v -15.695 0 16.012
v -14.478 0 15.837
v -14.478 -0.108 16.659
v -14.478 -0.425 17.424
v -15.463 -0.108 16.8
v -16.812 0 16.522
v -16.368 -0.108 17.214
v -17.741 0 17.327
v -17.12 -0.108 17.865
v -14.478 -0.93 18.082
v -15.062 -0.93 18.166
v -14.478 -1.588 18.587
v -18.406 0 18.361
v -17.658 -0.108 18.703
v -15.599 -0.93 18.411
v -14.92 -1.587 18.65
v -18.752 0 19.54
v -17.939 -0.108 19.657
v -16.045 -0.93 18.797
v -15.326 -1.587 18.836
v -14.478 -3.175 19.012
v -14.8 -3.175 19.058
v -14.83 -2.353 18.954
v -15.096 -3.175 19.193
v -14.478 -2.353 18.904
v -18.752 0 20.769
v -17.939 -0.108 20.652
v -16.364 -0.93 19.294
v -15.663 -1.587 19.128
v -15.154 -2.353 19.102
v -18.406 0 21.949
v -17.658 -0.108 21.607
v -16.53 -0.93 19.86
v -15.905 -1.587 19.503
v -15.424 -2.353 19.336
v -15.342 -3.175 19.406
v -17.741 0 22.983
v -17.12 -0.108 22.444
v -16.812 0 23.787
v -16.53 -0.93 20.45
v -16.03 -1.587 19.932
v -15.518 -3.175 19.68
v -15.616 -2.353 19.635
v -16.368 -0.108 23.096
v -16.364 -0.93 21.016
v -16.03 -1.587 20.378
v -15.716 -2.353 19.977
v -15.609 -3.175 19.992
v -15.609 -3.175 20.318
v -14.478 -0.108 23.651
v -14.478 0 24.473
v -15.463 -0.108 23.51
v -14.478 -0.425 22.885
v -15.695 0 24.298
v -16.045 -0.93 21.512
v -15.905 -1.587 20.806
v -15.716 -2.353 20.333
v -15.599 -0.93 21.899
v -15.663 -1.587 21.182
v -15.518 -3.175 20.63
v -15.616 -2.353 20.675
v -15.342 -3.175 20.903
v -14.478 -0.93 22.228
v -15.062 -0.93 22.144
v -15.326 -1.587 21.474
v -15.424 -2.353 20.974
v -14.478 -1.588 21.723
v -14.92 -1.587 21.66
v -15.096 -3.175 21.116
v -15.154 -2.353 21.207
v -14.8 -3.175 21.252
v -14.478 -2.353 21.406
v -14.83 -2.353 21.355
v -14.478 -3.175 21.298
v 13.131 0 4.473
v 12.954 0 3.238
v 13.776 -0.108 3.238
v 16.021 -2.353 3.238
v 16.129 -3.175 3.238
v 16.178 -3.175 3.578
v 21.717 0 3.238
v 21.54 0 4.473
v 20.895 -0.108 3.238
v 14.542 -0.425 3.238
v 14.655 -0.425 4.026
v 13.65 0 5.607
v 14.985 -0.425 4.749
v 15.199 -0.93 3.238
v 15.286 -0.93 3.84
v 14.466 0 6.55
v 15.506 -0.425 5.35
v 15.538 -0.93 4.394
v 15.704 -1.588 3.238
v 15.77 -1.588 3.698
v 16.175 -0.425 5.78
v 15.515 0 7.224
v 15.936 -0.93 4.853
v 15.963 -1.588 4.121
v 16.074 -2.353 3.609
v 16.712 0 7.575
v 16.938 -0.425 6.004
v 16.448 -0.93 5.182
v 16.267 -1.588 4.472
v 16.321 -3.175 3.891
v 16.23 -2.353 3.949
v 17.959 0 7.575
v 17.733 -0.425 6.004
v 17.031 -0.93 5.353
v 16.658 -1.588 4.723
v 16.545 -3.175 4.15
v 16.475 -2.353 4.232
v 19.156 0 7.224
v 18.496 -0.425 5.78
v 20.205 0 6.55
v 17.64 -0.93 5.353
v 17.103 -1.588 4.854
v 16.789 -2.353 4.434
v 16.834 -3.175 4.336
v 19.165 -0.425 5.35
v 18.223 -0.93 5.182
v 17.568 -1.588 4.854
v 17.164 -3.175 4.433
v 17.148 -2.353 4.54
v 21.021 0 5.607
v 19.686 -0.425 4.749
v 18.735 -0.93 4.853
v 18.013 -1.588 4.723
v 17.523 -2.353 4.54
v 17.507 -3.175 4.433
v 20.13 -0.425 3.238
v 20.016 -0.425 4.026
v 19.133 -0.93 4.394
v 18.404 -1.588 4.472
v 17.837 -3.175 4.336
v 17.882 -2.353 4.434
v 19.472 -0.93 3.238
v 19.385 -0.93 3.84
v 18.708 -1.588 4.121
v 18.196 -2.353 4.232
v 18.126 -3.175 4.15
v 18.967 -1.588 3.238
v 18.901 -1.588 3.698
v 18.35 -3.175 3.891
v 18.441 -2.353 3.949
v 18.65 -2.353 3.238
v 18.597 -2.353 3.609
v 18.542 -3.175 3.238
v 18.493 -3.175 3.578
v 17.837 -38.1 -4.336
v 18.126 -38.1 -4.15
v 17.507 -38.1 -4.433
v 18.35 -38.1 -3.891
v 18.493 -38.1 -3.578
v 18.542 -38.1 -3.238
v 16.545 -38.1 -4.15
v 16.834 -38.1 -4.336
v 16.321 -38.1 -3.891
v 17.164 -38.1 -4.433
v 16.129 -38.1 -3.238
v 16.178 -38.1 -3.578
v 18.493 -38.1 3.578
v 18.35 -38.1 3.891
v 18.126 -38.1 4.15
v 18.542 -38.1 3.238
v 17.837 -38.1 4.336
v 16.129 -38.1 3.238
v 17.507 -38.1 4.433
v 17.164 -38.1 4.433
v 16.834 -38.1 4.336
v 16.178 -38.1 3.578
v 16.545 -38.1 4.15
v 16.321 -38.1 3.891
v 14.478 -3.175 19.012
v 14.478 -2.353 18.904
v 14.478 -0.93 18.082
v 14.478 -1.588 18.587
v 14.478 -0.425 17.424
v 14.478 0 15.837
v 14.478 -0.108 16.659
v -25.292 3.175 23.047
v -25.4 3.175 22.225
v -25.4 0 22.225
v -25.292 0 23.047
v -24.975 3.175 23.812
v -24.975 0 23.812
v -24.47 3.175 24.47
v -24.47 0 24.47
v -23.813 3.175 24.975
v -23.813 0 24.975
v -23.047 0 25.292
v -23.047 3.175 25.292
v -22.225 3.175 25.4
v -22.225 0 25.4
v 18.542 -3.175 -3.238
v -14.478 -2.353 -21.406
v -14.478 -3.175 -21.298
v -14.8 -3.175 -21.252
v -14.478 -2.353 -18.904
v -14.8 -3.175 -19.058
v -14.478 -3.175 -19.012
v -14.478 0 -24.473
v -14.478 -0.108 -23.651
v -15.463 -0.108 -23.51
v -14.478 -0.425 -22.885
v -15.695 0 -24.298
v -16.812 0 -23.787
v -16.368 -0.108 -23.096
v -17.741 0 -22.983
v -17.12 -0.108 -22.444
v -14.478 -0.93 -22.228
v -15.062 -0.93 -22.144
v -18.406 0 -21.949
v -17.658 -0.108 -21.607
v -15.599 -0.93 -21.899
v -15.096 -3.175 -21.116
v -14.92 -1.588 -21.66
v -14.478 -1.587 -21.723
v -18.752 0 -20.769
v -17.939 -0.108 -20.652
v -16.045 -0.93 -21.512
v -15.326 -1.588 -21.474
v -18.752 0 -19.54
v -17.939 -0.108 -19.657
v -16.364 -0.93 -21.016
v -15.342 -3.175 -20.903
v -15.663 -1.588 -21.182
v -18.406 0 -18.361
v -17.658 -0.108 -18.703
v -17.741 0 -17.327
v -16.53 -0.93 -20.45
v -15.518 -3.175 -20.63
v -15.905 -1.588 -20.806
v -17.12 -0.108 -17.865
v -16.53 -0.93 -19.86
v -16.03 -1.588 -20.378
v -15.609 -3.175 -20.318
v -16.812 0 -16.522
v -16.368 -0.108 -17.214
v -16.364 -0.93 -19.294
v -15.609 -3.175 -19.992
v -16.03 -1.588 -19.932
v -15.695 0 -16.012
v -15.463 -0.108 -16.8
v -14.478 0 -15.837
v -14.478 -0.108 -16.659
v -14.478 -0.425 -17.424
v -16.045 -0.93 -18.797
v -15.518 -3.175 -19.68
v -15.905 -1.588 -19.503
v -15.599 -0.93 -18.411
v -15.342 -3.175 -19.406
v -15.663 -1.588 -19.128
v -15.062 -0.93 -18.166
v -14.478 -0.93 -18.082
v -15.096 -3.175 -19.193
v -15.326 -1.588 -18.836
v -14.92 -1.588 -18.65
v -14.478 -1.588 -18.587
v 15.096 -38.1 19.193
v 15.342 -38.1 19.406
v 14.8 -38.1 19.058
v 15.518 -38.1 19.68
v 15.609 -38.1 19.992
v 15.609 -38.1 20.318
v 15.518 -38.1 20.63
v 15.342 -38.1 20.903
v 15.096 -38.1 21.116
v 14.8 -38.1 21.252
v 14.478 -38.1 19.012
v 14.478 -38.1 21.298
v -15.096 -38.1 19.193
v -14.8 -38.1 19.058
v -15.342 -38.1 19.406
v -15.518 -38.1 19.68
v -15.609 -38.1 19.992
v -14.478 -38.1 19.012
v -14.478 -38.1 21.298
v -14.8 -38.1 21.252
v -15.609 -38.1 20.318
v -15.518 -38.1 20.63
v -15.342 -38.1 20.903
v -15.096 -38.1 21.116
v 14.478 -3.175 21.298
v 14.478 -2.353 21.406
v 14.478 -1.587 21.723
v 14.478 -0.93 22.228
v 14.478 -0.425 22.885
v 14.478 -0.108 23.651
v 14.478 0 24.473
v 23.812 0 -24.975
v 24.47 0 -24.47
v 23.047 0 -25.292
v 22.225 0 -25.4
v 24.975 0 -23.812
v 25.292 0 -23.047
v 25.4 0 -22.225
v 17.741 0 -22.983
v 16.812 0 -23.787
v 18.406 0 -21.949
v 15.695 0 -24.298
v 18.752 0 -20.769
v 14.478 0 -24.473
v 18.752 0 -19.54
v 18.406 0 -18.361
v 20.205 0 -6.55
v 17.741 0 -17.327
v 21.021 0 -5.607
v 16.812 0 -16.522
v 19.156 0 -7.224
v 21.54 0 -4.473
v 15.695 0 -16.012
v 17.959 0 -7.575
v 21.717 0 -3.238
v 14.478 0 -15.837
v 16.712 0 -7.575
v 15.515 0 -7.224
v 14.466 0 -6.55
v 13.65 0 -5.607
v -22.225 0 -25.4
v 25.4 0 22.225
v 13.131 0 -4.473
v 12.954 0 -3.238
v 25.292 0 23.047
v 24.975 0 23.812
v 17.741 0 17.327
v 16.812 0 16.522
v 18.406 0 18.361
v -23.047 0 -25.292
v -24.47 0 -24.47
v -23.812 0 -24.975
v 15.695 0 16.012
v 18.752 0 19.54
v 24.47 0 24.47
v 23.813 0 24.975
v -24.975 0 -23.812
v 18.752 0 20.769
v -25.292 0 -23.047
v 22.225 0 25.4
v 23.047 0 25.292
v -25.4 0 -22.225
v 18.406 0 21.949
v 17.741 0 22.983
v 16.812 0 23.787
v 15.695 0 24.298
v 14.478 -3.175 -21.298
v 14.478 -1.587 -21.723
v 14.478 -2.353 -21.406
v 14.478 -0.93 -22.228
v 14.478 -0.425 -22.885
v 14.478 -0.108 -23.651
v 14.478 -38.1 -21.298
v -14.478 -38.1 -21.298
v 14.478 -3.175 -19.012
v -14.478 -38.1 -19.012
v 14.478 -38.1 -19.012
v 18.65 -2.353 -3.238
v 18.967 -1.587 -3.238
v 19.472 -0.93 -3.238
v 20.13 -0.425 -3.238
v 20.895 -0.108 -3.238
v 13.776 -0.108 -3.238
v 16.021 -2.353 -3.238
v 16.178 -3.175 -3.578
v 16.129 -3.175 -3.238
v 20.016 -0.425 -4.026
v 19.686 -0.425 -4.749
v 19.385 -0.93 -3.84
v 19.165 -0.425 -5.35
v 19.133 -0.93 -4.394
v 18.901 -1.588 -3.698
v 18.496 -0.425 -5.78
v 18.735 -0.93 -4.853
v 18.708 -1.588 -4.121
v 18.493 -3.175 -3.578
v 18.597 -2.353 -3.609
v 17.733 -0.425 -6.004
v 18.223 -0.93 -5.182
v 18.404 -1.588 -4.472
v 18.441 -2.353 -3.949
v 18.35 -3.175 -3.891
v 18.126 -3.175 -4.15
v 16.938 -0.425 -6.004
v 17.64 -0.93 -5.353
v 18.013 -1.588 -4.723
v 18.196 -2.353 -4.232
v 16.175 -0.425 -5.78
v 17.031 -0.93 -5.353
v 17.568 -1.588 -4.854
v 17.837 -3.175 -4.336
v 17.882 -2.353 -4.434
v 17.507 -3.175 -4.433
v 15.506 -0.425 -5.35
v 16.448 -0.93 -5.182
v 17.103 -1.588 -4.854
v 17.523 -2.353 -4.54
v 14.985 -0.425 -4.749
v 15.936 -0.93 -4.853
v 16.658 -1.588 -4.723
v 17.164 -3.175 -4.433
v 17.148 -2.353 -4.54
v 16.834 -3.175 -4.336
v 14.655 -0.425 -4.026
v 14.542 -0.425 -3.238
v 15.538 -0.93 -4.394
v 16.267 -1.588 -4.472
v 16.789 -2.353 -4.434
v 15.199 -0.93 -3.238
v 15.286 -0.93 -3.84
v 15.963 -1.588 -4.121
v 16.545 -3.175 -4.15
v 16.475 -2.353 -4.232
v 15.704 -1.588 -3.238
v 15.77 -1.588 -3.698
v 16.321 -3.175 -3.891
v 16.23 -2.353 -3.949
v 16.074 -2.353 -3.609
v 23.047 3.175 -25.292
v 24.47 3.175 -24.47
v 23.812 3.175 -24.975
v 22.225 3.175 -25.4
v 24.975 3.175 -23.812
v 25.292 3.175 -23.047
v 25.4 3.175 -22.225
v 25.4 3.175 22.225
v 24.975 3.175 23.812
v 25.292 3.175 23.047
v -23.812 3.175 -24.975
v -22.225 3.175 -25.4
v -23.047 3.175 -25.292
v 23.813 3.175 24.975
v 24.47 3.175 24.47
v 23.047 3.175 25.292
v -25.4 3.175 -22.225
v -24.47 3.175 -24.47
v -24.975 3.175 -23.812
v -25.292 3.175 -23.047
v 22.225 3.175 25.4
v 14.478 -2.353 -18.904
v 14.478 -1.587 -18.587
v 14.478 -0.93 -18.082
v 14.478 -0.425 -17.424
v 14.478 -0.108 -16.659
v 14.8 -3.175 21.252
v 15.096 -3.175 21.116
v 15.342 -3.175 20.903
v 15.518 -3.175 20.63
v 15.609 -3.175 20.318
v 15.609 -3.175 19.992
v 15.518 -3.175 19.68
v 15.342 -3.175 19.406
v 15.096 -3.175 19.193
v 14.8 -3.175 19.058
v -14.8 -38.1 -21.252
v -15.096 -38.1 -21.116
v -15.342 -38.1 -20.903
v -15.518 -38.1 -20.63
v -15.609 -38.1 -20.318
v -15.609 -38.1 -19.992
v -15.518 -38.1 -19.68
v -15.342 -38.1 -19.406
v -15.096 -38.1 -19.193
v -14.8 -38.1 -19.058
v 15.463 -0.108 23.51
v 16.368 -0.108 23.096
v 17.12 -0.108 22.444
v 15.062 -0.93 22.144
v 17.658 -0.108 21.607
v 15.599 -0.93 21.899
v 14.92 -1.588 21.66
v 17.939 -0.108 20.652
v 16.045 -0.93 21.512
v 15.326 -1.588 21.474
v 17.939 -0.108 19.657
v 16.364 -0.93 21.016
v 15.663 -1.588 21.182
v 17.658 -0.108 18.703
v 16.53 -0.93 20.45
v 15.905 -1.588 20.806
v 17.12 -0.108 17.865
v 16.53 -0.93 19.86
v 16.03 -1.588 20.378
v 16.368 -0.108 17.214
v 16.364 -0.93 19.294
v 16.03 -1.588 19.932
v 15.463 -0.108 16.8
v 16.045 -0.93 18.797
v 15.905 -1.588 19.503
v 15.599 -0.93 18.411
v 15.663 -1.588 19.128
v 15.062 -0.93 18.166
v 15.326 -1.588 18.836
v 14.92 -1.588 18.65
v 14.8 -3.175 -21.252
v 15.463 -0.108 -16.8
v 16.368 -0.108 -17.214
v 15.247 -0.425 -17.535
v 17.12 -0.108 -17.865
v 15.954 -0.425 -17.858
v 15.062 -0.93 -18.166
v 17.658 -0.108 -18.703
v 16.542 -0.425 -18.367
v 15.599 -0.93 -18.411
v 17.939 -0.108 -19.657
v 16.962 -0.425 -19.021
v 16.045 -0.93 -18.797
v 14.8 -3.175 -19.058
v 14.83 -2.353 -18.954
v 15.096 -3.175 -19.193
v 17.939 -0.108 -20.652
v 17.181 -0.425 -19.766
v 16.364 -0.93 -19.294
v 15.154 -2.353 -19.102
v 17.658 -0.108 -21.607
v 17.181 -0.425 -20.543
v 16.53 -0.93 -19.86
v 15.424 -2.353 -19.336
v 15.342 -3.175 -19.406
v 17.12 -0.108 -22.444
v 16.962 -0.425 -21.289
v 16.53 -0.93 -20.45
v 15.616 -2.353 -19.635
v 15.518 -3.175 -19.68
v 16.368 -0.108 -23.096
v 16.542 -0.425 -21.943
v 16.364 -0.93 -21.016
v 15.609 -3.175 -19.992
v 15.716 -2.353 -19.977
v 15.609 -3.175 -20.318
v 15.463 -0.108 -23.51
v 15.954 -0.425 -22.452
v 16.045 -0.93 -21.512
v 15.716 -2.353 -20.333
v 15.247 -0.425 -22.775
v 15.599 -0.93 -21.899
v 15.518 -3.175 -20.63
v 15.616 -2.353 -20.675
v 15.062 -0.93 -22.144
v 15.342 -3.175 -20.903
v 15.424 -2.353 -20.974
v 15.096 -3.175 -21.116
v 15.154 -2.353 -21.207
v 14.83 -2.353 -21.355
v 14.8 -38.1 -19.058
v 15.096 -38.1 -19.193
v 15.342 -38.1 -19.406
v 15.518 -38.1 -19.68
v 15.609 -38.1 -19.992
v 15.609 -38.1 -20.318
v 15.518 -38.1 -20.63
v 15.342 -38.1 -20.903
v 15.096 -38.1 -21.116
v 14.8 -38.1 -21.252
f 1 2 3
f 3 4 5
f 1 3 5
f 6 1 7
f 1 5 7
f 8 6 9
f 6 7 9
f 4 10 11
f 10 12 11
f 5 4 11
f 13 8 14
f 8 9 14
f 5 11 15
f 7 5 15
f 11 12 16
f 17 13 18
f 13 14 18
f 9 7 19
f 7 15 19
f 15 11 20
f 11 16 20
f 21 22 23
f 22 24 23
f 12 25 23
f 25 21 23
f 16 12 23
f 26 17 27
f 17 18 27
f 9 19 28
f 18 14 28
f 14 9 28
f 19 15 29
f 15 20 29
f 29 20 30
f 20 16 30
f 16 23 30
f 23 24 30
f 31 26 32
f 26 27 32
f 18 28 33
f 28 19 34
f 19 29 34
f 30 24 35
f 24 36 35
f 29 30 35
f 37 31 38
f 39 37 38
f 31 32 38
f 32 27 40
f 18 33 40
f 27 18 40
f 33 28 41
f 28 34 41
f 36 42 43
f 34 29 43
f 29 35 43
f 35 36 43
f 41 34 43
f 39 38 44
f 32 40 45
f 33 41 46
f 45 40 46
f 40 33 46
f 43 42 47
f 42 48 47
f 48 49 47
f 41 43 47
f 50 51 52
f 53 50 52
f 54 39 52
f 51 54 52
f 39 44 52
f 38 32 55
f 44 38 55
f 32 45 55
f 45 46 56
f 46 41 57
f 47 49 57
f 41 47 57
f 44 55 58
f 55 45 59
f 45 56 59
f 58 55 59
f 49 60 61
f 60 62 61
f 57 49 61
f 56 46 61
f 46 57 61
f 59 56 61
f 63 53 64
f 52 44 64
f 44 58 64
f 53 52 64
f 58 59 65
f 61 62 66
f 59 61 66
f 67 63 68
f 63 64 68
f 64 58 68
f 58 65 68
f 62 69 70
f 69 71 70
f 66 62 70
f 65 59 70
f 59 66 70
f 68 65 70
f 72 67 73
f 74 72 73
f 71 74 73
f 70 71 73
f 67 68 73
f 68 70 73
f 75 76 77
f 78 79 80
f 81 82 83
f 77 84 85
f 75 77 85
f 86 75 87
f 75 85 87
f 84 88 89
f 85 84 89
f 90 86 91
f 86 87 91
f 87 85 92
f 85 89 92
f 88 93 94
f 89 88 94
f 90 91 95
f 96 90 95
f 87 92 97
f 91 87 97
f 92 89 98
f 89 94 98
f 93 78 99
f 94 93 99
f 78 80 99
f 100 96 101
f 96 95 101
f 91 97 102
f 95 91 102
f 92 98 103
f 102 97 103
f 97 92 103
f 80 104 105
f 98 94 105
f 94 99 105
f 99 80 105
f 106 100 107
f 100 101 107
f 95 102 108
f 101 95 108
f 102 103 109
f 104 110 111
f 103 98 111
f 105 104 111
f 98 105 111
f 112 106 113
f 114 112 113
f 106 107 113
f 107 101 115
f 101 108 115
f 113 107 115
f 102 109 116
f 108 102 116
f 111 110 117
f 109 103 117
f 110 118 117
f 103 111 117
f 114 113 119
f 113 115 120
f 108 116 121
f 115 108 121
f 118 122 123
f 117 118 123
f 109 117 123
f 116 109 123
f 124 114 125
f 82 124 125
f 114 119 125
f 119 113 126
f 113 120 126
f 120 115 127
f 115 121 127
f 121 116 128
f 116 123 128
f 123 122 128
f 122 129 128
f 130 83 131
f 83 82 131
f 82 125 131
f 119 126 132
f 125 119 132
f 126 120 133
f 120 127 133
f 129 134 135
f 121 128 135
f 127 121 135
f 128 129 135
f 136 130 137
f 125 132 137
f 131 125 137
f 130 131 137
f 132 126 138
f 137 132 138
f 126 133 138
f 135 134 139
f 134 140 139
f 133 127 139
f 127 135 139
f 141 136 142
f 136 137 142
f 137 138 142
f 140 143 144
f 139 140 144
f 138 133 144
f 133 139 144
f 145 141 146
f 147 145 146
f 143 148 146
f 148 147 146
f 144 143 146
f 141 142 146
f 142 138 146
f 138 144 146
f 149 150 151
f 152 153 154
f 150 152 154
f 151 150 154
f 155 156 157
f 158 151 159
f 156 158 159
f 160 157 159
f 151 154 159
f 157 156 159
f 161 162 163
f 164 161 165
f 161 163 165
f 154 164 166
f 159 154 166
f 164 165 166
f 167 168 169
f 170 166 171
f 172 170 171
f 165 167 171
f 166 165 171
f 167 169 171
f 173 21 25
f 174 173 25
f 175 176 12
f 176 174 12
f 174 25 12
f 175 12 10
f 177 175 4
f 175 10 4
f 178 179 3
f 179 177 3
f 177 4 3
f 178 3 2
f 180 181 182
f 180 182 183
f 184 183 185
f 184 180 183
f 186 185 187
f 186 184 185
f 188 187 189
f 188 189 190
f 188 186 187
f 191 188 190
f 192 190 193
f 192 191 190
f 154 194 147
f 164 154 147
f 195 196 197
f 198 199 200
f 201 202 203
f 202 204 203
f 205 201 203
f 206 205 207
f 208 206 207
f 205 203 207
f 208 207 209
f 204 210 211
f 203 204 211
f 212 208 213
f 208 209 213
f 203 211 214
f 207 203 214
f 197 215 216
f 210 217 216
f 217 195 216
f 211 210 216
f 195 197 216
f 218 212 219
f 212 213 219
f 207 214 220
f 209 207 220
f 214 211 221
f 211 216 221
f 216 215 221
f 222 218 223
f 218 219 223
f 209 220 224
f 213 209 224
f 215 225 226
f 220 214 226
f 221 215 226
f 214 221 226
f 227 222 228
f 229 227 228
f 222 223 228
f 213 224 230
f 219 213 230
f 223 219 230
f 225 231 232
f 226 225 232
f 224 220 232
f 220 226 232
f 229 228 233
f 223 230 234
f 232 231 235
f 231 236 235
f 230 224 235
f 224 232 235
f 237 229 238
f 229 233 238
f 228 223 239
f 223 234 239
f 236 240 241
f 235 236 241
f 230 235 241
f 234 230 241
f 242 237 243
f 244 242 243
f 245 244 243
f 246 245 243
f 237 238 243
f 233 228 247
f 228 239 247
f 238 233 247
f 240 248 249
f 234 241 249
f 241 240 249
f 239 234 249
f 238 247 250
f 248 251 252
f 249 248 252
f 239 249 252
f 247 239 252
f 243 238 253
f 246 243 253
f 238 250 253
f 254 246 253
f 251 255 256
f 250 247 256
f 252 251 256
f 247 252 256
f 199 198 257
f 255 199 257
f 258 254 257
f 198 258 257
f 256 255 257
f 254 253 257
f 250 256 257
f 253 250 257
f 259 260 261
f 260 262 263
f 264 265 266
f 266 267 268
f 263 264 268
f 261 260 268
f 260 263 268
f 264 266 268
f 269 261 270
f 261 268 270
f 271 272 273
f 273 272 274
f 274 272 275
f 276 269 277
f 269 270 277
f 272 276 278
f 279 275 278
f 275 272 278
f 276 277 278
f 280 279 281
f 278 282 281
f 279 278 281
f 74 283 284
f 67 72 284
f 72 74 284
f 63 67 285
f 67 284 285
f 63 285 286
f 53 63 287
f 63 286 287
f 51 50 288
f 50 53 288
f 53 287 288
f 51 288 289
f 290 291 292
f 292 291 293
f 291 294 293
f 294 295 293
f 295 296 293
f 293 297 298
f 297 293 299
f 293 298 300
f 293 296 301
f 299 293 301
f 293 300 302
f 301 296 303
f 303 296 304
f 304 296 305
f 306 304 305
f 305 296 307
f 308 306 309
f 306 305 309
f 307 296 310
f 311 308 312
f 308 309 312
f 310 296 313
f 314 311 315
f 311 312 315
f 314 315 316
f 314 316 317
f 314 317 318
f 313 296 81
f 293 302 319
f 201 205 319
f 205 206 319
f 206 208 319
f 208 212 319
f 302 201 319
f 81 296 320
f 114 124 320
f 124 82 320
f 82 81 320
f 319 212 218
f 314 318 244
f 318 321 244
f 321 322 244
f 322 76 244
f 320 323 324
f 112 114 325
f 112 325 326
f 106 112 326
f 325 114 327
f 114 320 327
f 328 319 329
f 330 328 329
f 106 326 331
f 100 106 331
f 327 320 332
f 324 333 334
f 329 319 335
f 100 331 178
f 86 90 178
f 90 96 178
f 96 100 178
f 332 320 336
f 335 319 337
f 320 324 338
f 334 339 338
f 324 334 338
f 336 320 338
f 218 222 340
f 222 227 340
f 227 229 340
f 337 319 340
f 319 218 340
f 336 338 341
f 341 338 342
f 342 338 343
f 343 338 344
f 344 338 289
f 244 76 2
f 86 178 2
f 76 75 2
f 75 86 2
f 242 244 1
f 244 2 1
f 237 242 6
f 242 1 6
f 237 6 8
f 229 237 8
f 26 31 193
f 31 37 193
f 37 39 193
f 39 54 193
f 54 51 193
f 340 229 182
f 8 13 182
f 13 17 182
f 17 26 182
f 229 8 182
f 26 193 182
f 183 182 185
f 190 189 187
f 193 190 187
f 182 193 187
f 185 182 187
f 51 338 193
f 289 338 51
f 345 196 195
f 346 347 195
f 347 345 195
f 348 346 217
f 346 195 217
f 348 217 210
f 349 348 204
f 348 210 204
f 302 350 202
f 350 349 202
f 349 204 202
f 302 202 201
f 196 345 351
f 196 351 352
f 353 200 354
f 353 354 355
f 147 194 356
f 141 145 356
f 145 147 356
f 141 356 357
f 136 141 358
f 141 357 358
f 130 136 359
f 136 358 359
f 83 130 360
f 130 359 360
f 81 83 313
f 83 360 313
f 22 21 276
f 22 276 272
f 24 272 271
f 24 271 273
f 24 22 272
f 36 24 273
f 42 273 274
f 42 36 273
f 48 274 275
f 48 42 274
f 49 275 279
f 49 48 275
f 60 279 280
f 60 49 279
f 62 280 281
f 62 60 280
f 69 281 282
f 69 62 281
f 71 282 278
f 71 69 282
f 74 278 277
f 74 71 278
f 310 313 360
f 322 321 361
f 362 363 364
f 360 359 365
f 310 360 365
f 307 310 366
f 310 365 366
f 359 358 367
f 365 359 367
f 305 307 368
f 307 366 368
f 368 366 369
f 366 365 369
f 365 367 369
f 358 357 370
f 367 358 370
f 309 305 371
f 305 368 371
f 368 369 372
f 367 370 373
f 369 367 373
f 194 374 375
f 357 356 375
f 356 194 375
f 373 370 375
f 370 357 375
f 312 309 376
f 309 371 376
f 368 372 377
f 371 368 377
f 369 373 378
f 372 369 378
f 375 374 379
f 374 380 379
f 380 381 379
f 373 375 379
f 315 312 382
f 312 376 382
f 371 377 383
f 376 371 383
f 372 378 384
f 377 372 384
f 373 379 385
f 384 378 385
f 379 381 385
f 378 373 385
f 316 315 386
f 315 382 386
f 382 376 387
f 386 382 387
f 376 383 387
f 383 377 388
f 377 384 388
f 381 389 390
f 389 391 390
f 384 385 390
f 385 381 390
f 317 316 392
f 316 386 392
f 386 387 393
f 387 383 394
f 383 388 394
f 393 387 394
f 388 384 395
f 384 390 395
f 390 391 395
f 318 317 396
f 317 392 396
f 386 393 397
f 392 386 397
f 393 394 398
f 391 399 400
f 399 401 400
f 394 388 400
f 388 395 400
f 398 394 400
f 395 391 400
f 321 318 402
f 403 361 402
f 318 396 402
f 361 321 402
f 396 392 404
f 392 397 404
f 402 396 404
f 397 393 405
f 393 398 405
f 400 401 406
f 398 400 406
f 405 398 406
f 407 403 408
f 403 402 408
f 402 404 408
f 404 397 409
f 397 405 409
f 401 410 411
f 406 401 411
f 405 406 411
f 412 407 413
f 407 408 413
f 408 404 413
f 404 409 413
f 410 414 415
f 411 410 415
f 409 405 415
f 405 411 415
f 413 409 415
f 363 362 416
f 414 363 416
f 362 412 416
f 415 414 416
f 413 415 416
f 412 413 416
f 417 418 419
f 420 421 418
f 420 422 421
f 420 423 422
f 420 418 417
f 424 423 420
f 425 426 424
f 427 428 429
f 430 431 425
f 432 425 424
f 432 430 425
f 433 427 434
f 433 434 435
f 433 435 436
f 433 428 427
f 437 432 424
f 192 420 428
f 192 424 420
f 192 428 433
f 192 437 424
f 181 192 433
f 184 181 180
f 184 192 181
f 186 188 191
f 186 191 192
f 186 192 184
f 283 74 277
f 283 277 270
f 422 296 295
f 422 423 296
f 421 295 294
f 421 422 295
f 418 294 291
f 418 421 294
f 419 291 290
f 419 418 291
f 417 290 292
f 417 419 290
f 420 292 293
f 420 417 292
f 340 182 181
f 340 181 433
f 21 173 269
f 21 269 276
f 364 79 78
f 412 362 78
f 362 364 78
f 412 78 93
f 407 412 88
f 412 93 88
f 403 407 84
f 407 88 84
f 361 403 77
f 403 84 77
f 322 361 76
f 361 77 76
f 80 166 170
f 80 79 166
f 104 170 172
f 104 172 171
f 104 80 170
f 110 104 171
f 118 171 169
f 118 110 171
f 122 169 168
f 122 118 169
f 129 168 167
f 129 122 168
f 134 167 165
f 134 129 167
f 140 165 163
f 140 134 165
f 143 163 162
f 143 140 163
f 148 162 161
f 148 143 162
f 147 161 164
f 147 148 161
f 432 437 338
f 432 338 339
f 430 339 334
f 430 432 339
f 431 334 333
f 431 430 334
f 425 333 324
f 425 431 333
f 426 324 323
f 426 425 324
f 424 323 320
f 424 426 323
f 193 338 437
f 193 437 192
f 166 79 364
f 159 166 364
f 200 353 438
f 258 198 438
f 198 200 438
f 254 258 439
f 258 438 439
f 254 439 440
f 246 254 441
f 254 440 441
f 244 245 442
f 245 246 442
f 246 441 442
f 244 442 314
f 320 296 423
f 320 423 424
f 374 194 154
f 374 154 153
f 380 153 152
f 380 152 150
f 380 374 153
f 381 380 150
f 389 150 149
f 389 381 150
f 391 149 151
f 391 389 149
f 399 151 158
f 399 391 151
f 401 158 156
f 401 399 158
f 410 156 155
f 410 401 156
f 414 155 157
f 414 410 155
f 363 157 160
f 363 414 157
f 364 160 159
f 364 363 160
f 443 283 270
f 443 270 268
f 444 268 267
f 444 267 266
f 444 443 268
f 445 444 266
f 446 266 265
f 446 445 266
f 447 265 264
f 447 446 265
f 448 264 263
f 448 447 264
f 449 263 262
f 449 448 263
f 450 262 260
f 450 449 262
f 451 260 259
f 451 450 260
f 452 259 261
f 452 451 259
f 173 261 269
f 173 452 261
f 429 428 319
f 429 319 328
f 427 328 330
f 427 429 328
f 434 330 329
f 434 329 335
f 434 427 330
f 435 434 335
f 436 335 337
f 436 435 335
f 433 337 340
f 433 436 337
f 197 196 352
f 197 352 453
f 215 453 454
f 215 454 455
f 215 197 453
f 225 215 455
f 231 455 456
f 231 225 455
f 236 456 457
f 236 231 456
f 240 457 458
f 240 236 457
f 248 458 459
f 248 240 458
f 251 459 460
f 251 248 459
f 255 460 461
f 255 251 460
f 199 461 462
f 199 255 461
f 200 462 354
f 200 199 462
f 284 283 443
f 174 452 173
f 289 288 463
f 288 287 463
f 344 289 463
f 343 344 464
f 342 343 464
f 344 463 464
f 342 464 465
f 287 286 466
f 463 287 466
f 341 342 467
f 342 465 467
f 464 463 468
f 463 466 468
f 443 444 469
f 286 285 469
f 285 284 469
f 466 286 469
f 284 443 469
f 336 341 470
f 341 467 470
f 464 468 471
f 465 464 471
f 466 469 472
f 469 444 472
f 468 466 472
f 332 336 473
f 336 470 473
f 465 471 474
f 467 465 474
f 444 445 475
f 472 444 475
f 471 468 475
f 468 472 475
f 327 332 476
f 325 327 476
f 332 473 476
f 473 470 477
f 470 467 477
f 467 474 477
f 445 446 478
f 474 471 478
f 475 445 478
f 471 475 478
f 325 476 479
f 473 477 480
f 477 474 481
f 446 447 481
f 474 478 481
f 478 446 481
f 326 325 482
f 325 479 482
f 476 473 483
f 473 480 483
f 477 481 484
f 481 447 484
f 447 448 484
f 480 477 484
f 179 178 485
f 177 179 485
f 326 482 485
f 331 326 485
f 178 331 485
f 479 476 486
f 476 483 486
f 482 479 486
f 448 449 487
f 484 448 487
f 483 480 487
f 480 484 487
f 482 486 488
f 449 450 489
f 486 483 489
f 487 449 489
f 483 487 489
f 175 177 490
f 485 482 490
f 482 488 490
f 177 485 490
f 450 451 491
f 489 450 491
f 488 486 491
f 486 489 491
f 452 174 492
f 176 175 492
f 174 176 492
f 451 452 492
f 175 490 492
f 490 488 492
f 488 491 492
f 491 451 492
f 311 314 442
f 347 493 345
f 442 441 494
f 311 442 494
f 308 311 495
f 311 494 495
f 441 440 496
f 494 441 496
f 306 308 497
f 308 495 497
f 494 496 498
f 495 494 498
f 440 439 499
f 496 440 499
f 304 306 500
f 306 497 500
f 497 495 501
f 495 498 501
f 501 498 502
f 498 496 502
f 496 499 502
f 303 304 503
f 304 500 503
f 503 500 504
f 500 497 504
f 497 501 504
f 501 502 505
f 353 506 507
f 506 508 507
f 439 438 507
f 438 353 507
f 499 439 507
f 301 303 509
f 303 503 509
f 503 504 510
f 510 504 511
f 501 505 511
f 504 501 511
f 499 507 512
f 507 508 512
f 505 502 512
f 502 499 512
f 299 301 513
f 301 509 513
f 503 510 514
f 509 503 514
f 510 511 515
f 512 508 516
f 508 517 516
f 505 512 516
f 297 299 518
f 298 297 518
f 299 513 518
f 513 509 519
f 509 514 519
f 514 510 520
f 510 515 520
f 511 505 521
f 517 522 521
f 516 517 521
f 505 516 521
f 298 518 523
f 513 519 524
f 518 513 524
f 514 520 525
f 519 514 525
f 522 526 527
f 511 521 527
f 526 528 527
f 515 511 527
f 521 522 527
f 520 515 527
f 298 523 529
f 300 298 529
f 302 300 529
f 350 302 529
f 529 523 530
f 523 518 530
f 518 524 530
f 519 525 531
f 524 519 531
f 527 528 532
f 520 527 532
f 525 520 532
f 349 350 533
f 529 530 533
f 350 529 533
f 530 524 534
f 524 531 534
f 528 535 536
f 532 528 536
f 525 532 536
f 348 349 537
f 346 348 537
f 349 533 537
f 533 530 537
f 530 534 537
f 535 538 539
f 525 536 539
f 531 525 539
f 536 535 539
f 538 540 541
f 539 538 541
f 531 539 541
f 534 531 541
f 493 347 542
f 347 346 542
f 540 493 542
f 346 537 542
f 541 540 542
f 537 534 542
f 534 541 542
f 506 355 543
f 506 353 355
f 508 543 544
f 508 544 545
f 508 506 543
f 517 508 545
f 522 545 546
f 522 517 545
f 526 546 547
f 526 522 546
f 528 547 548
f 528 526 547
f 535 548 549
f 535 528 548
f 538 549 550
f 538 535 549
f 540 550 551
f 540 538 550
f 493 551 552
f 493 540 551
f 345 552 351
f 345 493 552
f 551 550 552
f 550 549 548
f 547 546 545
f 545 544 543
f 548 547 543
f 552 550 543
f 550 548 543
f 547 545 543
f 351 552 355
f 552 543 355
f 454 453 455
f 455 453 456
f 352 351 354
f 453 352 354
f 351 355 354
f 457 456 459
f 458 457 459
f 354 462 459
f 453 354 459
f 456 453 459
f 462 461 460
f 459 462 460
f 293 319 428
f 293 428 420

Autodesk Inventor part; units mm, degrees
ref_plane "YZ Plane" through (0, 0, 0) normal (1, 0, 0) x (0, 1, 0)
ref_plane "XZ Plane" through (0, 0, 0) normal (0, 1, 0) x (-1, 0, 0)
ref_plane "XY Plane" through (0, 0, 0) normal (0, 0, 1) x (1, 0, 0)
sketch "Sketch1" plane through (0, 0, 0) normal (0, 1, 0) x (-1, 0, 0)
  line L0 (15.875, 20.1549) -> (-15.875, 20.1549) construction
  line L1 (14.478, 18.7579) -> (-14.478, 18.7579) construction
  line L2 (-14.478, 21.5519) -> (14.478, 21.5519) construction
  arc A0 (14.478, 18.7579) -> (14.478, 21.5519) centre (14.478, 20.1549) ccw construction
  arc A1 (-14.478, 21.5519) -> (-14.478, 18.7579) centre (-14.478, 20.1549) ccw construction
  line L3 (25.4, -25.4) -> (-25.4, -25.4)
  line L4 (-25.4, -25.4) -> (-25.4, 25.4)
  line L5 (-25.4, 25.4) -> (25.4, 25.4)
  line L6 (25.4, 25.4) -> (25.4, -25.4)
  line L7 (25.4, -25.4) -> (-25.4, 25.4) construction
  line L8 (-25.4, -25.4) -> (25.4, 25.4) construction
  line L9 (-15.875, -20.1549) -> (15.875, -20.1549) construction
  line L10 (-14.478, -18.7579) -> (14.478, -18.7579) construction
  line L11 (14.478, -21.5519) -> (-14.478, -21.5519) construction
  arc A2 (-14.478, -18.7579) -> (-14.478, -21.5519) centre (-14.478, -20.1549) ccw construction
  arc A3 (14.478, -21.5519) -> (14.478, -18.7579) centre (14.478, -20.1549) ccw construction
  line L12 (0, -20.1549) -> (0, 20.1549) construction
  line L13 (-17.3355, -4.699) -> (-17.3355, 4.699) construction
  line L14 (-15.875, -3.2385) -> (-15.875, 3.2385) construction
  line L15 (-18.796, 3.2385) -> (-18.796, -3.2385) construction
  arc A4 (-18.796, -3.2385) -> (-15.875, -3.2385) centre (-17.3355, -3.2385) ccw construction
  arc A5 (-15.875, 3.2385) -> (-18.796, 3.2385) centre (-17.3355, 3.2385) ccw construction
  line L16 (-14.478, -21.2979) -> (14.478, -21.2979)
  arc A6 (14.478, -21.2979) -> (14.478, -19.0119) centre (14.478, -20.1549) ccw
  line L17 (14.478, -19.0119) -> (-14.478, -19.0119)
  arc A7 (-14.478, -19.0119) -> (-14.478, -21.2979) centre (-14.478, -20.1549) ccw
  line L18 (-14.478, 19.0119) -> (14.478, 19.0119)
  arc A8 (14.478, 19.0119) -> (14.478, 21.2979) centre (14.478, 20.1549) ccw
  line L19 (14.478, 21.2979) -> (-14.478, 21.2979)
  arc A9 (-14.478, 21.2979) -> (-14.478, 19.0119) centre (-14.478, 20.1549) ccw
  line L20 (-16.129, 3.2385) -> (-16.129, -3.2385)
  arc A10 (-18.542, -3.2385) -> (-16.129, -3.2385) centre (-17.3355, -3.2385) ccw
  line L21 (-18.542, -3.2385) -> (-18.542, 3.2385)
  arc A11 (-16.129, 3.2385) -> (-18.542, 3.2385) centre (-17.3355, 3.2385) ccw
  point P0 (0, 0)
  point P1 (0, 0)
  point P2 (-17.3355, 0)
  point P3 (-15.875, -20.1549)
  dimension "d0" = 31.75
  dimension "d1" = 50.8
  dimension "d2" = 50.8
  dimension "d3" = 37.5158
  dimension "d4" = 2.794
  dimension "d5" = 31.75
  dimension "d6" = 2.794
  dimension "d7" = 9.398
  dimension "d8" = 2.921
  dimension "clear" = 0.254
  dimension "d10" = 0.254
  dimension "d11" = 0.254
extrude "Extrusion1" add sketch "Sketch1" along normal blind 3.175 contours L3 L4 L5 L6 | A7 L17 A6 L16 | A9 L19 A8 L18 | L20 A10 L21 A11
extrude "Extrusion2" add sketch "Sketch1" against normal blind 38.1 contours A7 L17 A6 L16 | A9 L19 A8 L18 | L20 A10 L21 A11
fillet "Fillet1" radius 3.175 4 edges at (25.4, 1.5875, 25.4) (-25.4, 1.5875, 25.4) (25.4, 1.5875, -25.4) (-25.4, 1.5875, -25.4)
fillet "Fillet2" radius 3.175 12 edges at (0, 0, -21.2979) (-15.621, 0, -20.1549) (0, 0, -19.0119) (15.621, 0, -20.1549) (17.3355, 0, 4.445) (18.542, 0, 0) (17.3355, 0, -4.445) (16.129, 0, 0) (-15.621, 0, 20.1549) (0, 0, 21.2979) (15.621, 0, 20.1549) (0, 0, 19.0119)
equation "\"d5\" = d0"
equation "\"d6\" = d4"
equation "\"d10\" = clear"
equation "\"d11\" = clear"
properties part number "vrm tool" material "ABS Plastic"
